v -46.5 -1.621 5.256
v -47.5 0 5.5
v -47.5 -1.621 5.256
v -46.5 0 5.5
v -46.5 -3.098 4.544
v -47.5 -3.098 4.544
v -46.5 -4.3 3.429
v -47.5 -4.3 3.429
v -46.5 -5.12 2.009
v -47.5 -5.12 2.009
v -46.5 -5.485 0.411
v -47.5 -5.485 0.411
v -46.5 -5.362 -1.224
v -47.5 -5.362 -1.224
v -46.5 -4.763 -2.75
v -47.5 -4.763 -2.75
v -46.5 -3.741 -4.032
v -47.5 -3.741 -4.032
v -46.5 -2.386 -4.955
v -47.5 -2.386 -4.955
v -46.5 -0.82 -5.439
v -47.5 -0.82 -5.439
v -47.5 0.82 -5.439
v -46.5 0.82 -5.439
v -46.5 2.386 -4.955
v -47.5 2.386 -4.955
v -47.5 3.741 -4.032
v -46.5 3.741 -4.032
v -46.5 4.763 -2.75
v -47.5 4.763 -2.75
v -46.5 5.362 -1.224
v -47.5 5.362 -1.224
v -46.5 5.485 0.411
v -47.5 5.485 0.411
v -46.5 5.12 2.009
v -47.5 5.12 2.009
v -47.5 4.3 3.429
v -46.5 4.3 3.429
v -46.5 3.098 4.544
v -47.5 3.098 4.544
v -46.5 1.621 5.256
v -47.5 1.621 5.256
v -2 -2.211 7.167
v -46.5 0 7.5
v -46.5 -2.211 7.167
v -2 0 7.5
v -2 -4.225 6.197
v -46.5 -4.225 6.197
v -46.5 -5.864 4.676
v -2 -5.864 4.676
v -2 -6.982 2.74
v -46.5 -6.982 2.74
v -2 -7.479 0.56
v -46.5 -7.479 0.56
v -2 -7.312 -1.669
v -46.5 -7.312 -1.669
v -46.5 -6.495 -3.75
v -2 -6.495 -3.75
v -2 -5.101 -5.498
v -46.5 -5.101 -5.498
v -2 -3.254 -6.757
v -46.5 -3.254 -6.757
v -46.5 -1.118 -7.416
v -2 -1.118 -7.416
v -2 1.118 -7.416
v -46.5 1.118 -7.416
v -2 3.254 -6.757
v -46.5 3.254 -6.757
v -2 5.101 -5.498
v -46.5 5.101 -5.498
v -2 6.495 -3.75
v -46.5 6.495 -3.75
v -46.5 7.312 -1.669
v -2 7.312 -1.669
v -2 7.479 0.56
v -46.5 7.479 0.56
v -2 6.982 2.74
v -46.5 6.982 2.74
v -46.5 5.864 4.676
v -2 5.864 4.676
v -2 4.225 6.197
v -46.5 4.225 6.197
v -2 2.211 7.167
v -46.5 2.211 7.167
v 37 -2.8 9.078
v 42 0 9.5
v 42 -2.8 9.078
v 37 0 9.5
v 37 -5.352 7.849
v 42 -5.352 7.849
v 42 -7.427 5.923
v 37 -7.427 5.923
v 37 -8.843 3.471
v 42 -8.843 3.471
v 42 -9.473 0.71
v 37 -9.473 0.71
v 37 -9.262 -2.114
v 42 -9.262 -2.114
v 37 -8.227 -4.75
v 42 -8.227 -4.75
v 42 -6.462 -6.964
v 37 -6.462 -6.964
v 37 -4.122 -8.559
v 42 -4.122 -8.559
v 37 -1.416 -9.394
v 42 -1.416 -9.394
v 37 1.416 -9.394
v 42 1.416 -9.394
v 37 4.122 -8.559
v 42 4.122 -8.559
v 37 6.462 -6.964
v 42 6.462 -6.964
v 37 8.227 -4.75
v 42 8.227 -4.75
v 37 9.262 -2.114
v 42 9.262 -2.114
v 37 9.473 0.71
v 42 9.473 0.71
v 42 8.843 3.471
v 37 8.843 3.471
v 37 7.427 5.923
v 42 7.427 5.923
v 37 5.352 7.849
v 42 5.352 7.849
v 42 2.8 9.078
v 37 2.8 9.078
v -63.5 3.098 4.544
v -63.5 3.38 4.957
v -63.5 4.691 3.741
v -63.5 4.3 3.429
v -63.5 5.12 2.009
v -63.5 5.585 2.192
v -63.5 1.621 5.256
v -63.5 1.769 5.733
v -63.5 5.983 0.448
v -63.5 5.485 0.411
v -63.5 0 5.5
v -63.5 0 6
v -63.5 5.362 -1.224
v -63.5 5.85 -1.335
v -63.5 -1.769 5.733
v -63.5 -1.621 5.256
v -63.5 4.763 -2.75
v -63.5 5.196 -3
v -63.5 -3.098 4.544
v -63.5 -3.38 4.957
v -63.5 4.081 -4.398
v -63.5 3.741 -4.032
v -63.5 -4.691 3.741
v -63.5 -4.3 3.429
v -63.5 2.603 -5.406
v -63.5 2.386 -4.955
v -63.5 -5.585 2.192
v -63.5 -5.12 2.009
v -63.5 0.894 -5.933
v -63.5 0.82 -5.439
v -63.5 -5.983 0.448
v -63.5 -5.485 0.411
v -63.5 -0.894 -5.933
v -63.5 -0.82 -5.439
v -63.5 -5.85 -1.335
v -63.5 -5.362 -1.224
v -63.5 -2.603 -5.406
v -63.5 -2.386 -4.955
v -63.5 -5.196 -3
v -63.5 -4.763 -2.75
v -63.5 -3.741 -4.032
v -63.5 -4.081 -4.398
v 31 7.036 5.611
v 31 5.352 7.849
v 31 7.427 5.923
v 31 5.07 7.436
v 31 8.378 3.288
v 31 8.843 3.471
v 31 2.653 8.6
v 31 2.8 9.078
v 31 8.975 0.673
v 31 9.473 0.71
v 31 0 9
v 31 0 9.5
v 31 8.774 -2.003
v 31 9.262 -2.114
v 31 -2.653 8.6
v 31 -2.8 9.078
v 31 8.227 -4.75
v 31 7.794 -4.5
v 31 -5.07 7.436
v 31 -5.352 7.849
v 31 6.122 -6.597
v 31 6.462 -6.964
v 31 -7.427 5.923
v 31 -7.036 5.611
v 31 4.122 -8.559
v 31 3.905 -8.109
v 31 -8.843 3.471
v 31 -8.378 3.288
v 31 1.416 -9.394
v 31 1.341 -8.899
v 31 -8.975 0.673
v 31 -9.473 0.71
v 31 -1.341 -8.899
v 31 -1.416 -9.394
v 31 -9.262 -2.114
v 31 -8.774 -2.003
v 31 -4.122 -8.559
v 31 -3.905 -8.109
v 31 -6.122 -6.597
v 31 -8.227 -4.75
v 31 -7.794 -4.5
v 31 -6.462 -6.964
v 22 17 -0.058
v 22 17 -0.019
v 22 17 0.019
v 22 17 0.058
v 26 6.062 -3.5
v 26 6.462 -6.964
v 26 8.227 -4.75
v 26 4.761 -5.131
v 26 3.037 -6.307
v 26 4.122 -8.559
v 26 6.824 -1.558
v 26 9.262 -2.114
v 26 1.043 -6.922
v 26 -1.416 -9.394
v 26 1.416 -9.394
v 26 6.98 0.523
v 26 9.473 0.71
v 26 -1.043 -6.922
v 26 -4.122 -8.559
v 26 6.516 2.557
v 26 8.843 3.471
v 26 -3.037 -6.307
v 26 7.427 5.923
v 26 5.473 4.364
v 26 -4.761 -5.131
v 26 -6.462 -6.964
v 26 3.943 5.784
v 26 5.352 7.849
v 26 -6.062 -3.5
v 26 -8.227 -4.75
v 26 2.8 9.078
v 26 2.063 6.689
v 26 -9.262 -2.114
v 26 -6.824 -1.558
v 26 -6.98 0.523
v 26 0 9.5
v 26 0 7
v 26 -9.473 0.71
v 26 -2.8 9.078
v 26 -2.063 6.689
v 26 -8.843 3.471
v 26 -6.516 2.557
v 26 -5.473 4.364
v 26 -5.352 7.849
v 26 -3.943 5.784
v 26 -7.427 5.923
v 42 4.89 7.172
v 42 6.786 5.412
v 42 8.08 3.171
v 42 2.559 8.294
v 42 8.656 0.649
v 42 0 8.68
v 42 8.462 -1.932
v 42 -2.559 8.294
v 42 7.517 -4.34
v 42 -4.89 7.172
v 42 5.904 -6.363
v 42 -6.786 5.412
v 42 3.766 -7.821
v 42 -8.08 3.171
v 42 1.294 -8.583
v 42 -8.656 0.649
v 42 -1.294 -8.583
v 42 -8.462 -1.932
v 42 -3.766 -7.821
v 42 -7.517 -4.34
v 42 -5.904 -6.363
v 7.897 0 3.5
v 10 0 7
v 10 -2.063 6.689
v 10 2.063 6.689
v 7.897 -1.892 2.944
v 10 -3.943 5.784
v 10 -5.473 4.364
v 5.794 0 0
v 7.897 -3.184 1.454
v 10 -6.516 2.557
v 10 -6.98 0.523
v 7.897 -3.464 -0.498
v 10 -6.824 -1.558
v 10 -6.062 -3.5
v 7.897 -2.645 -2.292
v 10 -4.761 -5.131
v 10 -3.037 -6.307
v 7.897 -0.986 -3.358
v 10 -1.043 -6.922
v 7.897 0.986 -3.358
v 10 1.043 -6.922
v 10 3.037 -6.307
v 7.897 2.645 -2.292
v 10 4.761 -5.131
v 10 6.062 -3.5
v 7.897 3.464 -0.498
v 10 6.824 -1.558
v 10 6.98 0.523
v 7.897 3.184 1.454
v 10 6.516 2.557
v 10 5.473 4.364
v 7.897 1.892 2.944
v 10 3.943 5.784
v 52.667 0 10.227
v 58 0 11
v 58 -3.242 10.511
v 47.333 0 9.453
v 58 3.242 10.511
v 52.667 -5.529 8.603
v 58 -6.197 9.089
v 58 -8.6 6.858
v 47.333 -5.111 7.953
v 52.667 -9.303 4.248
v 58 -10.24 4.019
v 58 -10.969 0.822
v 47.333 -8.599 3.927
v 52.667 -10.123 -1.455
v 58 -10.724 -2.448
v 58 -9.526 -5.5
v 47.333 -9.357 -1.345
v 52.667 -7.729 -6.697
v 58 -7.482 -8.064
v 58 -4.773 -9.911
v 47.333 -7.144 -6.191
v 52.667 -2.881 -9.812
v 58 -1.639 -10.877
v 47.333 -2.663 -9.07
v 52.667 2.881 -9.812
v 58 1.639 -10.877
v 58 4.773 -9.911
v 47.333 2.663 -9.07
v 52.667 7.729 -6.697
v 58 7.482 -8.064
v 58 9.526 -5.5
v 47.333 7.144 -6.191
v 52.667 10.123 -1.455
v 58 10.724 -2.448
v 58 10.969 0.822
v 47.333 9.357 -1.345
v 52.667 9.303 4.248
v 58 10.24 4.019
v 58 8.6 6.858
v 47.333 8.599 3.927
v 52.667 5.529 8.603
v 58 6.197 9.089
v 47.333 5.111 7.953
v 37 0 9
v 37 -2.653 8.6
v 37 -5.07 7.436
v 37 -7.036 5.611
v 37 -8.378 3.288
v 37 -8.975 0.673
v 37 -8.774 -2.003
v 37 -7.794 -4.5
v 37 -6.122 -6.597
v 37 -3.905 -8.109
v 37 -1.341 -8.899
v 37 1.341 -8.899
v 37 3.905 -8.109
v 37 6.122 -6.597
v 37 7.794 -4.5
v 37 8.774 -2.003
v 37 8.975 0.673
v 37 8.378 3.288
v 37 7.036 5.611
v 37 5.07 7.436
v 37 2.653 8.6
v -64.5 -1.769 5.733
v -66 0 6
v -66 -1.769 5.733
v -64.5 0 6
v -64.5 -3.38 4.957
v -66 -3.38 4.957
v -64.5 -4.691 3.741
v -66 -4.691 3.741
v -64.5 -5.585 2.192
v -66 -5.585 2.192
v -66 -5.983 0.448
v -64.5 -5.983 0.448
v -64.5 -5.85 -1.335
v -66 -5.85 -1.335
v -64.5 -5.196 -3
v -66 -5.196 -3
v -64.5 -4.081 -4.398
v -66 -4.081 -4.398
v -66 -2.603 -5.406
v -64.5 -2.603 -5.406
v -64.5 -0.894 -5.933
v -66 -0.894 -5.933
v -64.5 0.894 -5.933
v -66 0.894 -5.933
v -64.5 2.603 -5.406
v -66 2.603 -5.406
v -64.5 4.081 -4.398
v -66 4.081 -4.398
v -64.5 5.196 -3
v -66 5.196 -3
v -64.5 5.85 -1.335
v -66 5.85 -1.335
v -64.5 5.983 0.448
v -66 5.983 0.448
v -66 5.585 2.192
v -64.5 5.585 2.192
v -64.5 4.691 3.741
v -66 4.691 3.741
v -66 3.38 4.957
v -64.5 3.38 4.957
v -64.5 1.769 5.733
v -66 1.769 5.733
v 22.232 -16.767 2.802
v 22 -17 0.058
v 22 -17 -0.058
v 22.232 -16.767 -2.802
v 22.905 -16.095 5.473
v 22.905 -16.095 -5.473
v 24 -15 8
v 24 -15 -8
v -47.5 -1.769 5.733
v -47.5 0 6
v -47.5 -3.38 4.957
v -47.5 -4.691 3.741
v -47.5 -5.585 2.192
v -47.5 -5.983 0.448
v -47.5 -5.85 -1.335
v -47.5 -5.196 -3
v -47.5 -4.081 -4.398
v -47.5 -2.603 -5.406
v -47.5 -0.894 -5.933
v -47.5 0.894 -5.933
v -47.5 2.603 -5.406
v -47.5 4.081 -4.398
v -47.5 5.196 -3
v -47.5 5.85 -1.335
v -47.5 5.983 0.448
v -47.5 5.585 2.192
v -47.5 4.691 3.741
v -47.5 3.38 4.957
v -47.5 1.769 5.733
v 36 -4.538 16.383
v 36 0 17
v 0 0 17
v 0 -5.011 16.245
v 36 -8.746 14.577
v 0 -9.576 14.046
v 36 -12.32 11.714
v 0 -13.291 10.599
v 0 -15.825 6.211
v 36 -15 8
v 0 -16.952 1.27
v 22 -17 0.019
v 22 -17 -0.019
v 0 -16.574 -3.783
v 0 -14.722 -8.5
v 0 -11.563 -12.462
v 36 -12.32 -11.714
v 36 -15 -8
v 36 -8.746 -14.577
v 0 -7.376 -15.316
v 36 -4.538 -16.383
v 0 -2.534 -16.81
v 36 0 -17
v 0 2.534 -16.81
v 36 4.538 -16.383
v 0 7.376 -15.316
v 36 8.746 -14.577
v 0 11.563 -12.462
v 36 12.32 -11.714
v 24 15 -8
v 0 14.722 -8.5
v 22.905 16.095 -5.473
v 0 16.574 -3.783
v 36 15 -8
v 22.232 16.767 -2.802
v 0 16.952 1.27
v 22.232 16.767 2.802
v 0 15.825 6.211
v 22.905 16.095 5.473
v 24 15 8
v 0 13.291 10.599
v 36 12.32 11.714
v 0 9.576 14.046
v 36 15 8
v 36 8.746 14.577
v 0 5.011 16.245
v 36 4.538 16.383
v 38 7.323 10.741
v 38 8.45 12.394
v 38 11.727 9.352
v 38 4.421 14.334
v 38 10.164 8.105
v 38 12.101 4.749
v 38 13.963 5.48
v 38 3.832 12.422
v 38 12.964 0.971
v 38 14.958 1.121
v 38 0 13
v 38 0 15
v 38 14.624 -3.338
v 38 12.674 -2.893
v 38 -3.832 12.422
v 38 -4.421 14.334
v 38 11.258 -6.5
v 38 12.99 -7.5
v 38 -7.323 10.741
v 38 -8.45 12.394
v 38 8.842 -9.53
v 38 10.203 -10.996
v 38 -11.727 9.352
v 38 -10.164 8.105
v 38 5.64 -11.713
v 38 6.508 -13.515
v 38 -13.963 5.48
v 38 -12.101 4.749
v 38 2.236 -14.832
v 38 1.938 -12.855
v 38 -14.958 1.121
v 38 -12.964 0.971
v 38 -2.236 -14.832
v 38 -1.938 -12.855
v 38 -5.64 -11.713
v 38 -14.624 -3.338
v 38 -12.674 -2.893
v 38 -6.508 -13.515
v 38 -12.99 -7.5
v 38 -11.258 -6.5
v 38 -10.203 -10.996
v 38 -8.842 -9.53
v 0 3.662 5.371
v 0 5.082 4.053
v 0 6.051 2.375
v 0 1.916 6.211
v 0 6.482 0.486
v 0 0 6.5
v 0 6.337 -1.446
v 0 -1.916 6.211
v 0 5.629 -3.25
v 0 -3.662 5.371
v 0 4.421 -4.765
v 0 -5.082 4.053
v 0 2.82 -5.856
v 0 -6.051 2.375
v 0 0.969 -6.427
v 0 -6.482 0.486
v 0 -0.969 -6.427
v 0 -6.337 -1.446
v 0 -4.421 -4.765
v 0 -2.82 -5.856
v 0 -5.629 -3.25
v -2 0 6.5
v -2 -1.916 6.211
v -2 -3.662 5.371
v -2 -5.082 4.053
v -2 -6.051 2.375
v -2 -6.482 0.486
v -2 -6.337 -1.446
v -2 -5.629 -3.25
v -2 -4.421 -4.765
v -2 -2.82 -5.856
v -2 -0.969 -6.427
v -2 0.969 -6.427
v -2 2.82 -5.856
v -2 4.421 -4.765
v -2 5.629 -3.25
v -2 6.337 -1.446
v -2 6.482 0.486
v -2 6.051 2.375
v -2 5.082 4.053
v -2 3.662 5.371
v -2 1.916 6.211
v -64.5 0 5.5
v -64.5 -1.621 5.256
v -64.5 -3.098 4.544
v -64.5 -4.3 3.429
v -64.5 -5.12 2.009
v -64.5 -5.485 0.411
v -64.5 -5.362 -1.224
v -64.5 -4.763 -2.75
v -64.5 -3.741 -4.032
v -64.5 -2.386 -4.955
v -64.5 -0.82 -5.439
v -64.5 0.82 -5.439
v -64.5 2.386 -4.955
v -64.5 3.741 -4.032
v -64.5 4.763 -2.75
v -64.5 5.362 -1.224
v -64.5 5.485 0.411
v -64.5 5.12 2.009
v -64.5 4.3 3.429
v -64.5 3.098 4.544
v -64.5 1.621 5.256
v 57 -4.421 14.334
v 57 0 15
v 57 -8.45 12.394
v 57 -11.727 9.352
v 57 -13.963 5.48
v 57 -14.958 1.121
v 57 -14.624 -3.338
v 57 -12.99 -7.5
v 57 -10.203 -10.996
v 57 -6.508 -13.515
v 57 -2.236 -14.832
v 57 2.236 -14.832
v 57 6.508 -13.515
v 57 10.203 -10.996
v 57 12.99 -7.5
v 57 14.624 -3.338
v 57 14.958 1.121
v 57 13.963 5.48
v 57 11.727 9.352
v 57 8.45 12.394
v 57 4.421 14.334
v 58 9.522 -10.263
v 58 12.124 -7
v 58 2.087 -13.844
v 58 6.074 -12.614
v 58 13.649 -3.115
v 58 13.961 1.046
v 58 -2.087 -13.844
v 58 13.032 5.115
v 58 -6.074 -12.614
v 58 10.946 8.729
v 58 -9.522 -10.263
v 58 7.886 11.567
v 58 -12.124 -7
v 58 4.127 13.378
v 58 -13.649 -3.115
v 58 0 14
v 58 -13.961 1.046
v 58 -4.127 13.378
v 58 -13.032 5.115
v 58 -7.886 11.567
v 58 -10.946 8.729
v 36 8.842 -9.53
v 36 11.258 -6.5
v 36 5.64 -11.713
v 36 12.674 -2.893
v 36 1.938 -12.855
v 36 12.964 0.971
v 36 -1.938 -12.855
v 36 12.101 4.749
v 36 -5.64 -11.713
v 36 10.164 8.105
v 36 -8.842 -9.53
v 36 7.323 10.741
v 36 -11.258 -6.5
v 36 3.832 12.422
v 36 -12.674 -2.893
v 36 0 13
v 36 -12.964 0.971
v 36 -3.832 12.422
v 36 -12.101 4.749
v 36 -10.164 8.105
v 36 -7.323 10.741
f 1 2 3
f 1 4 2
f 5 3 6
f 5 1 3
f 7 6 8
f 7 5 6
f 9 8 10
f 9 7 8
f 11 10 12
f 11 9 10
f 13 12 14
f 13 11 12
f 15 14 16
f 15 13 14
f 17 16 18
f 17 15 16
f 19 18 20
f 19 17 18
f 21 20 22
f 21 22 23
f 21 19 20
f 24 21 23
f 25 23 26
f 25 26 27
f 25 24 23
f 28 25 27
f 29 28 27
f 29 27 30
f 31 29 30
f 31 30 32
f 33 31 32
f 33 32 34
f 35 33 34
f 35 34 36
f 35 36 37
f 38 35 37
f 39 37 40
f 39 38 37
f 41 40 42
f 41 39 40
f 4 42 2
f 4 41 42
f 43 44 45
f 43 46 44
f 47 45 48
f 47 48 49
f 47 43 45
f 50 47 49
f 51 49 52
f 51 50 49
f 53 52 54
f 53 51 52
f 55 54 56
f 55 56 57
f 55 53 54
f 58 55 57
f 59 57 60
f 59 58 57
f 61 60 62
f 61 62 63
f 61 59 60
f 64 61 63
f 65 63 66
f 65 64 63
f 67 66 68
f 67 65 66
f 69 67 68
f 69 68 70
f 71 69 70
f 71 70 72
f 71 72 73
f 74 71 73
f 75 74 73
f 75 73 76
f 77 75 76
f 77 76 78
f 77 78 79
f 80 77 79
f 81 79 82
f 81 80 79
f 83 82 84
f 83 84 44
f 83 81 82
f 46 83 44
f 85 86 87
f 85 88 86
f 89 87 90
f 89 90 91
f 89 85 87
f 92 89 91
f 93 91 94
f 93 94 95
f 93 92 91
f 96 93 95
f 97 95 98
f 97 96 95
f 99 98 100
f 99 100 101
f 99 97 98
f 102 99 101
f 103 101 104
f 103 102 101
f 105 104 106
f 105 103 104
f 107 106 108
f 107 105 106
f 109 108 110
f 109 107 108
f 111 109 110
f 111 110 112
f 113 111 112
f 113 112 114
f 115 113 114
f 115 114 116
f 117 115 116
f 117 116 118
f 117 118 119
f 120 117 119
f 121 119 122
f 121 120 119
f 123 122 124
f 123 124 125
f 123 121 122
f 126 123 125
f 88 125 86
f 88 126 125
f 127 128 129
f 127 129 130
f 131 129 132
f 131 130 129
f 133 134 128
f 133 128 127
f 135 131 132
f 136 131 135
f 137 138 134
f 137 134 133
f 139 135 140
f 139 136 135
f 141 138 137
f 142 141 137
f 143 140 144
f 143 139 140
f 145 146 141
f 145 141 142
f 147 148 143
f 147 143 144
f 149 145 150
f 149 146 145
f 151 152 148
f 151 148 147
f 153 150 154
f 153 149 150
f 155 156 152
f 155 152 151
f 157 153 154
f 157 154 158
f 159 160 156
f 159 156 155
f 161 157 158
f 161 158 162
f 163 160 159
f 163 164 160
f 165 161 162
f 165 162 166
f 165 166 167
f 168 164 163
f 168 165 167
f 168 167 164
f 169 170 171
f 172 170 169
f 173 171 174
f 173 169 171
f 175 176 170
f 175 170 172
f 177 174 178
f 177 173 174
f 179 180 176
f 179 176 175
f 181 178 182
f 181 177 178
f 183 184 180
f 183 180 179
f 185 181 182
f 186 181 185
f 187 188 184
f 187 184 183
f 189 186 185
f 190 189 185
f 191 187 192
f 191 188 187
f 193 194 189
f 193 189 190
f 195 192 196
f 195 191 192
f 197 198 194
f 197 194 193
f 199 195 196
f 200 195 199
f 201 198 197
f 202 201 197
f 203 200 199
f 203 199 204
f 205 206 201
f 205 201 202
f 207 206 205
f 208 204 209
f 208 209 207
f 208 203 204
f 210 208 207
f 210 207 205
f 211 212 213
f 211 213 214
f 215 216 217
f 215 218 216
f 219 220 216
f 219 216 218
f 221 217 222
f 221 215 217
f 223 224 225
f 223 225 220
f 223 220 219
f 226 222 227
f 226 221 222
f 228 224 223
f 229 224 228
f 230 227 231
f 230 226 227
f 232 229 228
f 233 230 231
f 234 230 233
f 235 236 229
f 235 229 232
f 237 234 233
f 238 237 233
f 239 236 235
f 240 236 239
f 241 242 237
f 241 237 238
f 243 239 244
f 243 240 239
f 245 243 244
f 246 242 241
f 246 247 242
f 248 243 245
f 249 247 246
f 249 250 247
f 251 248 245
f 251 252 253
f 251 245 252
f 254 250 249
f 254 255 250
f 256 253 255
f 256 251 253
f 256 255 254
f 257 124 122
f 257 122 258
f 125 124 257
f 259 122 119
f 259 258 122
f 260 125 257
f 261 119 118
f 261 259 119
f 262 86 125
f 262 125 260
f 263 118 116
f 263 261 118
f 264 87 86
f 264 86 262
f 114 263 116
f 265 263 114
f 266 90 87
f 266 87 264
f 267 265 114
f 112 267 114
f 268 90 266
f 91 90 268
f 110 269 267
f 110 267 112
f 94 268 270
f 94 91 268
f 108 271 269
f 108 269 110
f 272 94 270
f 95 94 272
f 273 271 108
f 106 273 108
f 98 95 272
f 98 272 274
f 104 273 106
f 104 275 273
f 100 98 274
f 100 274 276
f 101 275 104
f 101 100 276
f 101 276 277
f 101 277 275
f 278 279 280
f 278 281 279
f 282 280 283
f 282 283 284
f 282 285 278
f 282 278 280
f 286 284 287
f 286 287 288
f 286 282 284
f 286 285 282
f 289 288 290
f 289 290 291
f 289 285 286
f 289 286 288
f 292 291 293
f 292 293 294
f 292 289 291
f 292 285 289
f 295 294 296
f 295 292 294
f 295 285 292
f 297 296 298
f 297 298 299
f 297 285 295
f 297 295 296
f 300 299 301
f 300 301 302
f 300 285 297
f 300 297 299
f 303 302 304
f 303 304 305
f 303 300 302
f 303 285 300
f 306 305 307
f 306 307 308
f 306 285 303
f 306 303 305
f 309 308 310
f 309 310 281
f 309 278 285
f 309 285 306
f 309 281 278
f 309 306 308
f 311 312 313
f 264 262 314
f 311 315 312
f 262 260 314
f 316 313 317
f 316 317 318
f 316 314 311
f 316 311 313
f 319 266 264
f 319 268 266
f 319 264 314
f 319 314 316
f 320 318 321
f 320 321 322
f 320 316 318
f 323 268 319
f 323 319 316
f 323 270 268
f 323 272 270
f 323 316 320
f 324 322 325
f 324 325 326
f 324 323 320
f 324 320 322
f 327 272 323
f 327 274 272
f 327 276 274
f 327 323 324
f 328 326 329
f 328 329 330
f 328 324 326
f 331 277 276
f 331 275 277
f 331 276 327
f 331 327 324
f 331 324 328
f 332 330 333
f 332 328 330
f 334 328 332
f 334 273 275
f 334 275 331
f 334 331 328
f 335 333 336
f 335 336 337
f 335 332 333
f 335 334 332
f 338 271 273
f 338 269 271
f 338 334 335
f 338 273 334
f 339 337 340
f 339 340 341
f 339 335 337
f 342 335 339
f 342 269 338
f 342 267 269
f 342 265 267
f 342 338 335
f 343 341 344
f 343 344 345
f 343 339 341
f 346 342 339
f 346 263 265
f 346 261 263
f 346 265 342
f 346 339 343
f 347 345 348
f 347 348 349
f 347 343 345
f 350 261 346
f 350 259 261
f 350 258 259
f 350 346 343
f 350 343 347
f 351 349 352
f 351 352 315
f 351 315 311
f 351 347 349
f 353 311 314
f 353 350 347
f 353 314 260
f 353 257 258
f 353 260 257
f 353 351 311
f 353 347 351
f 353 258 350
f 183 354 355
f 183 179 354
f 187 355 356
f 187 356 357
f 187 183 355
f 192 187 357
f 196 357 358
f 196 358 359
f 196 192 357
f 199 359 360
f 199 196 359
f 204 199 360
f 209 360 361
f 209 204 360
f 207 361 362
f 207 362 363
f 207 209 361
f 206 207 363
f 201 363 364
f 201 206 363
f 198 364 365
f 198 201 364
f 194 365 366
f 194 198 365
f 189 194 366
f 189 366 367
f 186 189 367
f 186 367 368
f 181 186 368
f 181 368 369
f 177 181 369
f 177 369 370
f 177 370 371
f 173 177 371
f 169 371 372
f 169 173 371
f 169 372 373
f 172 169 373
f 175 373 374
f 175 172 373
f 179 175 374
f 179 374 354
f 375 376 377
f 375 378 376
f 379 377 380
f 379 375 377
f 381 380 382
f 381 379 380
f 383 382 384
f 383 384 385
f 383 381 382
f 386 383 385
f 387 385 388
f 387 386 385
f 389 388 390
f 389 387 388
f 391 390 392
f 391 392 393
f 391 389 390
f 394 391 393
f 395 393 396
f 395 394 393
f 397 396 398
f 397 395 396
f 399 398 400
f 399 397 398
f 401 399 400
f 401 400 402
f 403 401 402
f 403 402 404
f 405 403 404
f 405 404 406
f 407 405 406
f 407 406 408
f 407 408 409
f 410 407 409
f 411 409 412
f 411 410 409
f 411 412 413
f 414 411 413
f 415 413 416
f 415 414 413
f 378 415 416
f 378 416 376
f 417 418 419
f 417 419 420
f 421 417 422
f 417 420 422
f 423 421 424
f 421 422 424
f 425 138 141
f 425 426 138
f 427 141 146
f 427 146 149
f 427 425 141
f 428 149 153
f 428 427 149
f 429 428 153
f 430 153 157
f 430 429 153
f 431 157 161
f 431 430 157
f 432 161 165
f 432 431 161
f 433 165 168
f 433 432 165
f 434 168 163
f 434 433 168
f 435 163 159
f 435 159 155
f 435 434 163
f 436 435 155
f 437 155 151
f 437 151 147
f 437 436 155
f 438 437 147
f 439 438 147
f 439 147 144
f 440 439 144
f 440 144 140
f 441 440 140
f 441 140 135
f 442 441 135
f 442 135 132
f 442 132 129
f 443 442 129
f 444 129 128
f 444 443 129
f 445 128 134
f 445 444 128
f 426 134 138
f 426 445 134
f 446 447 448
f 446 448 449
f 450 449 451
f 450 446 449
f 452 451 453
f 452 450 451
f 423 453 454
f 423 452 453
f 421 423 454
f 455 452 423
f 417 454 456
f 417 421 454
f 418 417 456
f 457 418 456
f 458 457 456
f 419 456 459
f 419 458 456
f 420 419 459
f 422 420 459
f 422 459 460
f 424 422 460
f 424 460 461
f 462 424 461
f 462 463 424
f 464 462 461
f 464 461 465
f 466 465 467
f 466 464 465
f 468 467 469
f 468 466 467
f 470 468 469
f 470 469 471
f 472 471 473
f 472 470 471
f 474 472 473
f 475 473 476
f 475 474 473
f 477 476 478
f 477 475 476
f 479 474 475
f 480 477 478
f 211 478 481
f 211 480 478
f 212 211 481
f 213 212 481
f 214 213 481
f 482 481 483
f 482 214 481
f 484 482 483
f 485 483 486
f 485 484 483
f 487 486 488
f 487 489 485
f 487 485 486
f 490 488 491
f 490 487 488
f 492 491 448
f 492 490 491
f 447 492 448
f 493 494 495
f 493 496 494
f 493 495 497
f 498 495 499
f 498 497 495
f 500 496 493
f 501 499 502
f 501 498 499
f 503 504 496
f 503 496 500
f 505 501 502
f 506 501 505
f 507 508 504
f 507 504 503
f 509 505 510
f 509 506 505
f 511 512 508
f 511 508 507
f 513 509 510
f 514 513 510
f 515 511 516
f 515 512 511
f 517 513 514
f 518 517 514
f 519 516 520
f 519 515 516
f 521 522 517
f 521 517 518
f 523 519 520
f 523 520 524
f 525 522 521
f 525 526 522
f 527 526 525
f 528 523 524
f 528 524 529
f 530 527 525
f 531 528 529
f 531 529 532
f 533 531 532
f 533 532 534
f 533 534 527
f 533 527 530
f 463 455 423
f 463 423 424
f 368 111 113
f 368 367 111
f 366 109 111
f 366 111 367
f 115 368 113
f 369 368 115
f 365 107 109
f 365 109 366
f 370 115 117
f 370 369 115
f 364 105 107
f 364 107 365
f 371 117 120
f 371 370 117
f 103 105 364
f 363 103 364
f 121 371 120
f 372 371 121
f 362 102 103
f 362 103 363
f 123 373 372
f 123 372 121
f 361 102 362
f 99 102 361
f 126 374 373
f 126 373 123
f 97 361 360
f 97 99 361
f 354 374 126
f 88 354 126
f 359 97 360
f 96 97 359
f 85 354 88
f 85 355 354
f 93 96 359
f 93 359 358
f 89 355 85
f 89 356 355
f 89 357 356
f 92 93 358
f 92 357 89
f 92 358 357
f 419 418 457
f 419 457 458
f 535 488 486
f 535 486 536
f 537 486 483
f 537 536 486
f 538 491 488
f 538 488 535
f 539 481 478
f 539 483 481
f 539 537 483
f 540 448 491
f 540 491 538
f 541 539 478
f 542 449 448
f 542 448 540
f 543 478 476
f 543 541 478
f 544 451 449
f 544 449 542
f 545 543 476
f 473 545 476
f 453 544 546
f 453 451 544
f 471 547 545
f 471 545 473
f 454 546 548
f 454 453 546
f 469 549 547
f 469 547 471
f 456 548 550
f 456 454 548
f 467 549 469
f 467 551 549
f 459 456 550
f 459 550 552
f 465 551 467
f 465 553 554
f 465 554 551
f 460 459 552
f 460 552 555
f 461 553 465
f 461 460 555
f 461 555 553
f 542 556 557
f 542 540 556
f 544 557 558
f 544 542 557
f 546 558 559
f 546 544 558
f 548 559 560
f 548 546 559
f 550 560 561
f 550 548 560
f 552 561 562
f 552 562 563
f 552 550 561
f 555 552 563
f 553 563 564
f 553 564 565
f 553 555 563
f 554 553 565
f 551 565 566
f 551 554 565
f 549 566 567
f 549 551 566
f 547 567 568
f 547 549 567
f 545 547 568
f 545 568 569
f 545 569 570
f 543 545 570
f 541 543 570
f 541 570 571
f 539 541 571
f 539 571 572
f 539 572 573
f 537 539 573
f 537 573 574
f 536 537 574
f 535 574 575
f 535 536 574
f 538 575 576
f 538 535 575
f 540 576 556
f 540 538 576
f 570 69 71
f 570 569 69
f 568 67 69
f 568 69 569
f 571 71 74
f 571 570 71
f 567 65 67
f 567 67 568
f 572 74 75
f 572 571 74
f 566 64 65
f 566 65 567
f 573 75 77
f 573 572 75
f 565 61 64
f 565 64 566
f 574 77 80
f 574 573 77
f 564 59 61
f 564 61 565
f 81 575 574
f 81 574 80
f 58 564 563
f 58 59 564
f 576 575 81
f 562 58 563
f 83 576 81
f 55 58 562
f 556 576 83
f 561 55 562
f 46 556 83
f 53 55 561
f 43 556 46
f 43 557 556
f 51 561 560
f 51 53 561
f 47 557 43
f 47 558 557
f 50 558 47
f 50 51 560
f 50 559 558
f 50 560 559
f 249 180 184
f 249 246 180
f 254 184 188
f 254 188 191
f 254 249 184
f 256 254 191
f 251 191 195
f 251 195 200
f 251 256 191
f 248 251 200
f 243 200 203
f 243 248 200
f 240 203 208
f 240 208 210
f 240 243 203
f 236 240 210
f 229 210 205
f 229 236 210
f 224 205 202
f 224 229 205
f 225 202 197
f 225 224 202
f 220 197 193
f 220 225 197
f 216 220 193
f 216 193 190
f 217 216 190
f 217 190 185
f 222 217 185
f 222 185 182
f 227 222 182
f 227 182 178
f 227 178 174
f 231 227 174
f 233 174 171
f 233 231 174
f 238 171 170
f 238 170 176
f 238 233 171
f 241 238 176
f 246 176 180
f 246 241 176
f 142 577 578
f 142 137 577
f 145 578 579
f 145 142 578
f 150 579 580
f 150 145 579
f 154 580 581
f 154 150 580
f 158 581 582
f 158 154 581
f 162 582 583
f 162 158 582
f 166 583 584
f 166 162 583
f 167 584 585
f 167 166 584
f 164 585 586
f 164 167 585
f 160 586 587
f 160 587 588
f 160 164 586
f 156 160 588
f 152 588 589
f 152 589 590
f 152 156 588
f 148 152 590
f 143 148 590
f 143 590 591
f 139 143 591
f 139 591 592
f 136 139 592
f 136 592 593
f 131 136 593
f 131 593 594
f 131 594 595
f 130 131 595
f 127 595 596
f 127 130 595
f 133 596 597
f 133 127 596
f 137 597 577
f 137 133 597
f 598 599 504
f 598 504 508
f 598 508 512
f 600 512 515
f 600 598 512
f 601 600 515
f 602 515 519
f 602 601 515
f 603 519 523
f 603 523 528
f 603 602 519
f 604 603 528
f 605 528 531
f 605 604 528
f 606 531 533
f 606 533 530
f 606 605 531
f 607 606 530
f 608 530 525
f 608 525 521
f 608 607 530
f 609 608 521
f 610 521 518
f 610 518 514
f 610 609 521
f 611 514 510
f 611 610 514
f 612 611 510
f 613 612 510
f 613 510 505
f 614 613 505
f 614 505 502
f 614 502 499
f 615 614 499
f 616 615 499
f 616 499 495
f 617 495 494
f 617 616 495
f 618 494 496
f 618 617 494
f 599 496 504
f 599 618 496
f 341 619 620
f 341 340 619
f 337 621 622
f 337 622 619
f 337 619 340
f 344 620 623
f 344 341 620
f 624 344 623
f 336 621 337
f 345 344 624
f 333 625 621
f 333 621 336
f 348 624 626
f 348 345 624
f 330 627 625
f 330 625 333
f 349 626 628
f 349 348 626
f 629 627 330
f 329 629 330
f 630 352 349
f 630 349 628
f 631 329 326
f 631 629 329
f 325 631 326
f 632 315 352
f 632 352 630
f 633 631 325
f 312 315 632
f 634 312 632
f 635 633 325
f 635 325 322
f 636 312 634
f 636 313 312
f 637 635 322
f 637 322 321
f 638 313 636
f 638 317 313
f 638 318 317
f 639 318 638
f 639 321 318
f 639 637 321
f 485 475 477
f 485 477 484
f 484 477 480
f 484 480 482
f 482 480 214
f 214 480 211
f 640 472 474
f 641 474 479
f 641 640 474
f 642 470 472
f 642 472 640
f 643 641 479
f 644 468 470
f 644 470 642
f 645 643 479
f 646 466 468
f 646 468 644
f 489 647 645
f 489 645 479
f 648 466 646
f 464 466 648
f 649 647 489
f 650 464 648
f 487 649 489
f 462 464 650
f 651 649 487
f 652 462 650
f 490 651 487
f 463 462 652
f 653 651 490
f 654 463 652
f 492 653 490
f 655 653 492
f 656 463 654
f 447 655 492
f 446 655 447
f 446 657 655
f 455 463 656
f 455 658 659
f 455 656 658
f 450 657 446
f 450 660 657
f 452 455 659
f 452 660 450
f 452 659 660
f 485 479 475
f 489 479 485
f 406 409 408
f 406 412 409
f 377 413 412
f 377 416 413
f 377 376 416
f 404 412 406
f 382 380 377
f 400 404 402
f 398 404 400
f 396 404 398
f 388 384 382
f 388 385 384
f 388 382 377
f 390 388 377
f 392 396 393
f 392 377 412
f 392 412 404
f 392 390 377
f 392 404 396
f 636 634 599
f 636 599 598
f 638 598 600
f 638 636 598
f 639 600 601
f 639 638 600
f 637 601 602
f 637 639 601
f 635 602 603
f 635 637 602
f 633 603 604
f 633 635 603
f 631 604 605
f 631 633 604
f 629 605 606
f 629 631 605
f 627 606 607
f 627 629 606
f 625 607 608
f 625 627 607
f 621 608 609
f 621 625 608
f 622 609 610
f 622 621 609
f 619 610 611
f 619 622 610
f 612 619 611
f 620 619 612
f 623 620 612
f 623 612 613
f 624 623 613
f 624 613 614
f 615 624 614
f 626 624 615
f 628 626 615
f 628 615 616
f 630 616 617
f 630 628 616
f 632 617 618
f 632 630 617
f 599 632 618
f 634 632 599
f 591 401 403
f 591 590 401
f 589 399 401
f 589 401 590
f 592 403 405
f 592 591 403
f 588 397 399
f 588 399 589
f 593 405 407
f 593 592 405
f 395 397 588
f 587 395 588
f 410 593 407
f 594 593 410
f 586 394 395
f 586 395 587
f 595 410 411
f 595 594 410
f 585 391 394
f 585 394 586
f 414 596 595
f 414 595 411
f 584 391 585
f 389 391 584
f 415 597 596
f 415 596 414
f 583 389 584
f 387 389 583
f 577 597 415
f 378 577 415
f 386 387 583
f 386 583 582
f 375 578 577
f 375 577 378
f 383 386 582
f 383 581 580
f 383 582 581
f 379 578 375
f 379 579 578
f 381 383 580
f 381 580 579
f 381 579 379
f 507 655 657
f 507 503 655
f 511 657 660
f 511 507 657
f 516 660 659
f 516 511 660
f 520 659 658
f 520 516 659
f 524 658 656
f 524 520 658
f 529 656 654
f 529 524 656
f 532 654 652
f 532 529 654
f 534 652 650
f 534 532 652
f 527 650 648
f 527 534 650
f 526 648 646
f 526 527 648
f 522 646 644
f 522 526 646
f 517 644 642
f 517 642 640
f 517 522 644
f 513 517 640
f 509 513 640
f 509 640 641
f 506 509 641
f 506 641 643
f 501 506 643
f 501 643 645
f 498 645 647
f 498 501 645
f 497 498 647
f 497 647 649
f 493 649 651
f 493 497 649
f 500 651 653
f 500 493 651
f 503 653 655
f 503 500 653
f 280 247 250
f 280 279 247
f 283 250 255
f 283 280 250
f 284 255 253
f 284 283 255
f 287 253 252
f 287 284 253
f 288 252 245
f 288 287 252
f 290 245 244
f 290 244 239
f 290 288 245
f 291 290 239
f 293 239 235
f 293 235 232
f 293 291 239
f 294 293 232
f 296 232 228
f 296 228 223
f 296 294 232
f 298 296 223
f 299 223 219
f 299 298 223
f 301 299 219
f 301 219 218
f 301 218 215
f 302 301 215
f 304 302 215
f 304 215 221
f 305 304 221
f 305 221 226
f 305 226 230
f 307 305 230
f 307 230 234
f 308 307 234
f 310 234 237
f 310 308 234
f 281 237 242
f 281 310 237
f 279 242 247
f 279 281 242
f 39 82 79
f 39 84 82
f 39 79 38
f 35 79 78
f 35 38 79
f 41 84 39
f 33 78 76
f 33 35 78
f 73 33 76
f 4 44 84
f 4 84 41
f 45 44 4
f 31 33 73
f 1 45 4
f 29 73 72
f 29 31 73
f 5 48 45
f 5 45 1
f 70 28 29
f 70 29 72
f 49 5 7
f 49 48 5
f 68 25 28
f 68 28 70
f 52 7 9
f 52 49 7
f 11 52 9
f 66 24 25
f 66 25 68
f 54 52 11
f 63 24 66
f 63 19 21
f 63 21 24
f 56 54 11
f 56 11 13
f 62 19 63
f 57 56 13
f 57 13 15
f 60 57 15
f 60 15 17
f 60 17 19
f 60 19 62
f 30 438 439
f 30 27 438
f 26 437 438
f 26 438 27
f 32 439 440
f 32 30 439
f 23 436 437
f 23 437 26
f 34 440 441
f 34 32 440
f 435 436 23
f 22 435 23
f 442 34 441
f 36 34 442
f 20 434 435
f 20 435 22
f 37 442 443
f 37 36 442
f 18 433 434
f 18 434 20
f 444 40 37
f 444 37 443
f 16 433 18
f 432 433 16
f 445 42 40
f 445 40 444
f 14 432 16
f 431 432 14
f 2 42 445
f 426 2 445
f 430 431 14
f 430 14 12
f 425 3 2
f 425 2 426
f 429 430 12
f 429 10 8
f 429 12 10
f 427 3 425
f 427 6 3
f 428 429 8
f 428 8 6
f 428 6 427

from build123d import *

# Parameters (mm, degrees)
SKETCH_4_OUTSIDE_W  = 62.6
SKETCH_4_OUTSIDE_H  = 62.6
CUT_EXTRUDE_2_DEPTH = 14
CHAMFER_1_SIZE      = 2
CHAMFER_2_SIZE      = 1


with BuildPart() as part:
    # 草图1 → 旋转1 (revolve)
    with BuildSketch(Plane.XY, mode=Mode.PRIVATE) as revolve_1_sk:
        Polygon((0, 6.5), (0, 17), (36, 17), (36, 13), (38, 13), (38, 15), (58, 15), (58, 11), (42, 8.680110408), (42, 9.5), (37, 9.5), (37, 9), (31, 9), (31, 9.5), (26, 9.5), (26, 7), (10, 7), (5.793975667, 0), (-66, 0), (-66, 6), (-64.5, 6), (-64.5, 5.5), (-63.5, 5.5), (-63.5, 6), (-47.5, 6), (-47.5, 5.5), (-46.5, 5.5), (-46.5, 7.5), (-2, 7.5), (-2, 6.5), align=None)
    revolve(revolve_1_sk.sketch.rotate(Axis((-14.714771185, 0, 0), (1, 0, 0)), 90), axis=Axis((-14.714771185, 0, 0), (1, 0, 0)))

    # 草图4 outside → 切除-拉伸2 (cut)
    with BuildSketch(Plane(origin=(36, 0, 0), x_dir=(0, 0, -1), z_dir=(1, 0, 0))):
        Rectangle(SKETCH_4_OUTSIDE_W, SKETCH_4_OUTSIDE_H)
        with BuildLine():
            Line((-8, -15), (8, -15))
            ThreePointArc((8, -15), (17, 0), (8, 15))
            Line((8, 15), (-8, 15))
            ThreePointArc((-8, 15), (-17, 0), (-8, -15))
        make_face(mode=Mode.SUBTRACT)
    extrude(amount=-CUT_EXTRUDE_2_DEPTH, mode=Mode.SUBTRACT)

    # 倒角1
    chamfer_1_edges = [part.edges().sort_by_distance(p)[0] for p in [
        (22, -15, 0),
        (22, 15, 0),
    ]]
    chamfer(chamfer_1_edges, length=CHAMFER_1_SIZE - 0.0001)  # a hair under: the kernel refuses the full size

    # 倒角2
    chamfer_2_edges = [part.edges().sort_by_distance(p)[0] for p in [
        (58, 0, -15),
    ]]
    chamfer(chamfer_2_edges, length=CHAMFER_2_SIZE)


solid = part.part
